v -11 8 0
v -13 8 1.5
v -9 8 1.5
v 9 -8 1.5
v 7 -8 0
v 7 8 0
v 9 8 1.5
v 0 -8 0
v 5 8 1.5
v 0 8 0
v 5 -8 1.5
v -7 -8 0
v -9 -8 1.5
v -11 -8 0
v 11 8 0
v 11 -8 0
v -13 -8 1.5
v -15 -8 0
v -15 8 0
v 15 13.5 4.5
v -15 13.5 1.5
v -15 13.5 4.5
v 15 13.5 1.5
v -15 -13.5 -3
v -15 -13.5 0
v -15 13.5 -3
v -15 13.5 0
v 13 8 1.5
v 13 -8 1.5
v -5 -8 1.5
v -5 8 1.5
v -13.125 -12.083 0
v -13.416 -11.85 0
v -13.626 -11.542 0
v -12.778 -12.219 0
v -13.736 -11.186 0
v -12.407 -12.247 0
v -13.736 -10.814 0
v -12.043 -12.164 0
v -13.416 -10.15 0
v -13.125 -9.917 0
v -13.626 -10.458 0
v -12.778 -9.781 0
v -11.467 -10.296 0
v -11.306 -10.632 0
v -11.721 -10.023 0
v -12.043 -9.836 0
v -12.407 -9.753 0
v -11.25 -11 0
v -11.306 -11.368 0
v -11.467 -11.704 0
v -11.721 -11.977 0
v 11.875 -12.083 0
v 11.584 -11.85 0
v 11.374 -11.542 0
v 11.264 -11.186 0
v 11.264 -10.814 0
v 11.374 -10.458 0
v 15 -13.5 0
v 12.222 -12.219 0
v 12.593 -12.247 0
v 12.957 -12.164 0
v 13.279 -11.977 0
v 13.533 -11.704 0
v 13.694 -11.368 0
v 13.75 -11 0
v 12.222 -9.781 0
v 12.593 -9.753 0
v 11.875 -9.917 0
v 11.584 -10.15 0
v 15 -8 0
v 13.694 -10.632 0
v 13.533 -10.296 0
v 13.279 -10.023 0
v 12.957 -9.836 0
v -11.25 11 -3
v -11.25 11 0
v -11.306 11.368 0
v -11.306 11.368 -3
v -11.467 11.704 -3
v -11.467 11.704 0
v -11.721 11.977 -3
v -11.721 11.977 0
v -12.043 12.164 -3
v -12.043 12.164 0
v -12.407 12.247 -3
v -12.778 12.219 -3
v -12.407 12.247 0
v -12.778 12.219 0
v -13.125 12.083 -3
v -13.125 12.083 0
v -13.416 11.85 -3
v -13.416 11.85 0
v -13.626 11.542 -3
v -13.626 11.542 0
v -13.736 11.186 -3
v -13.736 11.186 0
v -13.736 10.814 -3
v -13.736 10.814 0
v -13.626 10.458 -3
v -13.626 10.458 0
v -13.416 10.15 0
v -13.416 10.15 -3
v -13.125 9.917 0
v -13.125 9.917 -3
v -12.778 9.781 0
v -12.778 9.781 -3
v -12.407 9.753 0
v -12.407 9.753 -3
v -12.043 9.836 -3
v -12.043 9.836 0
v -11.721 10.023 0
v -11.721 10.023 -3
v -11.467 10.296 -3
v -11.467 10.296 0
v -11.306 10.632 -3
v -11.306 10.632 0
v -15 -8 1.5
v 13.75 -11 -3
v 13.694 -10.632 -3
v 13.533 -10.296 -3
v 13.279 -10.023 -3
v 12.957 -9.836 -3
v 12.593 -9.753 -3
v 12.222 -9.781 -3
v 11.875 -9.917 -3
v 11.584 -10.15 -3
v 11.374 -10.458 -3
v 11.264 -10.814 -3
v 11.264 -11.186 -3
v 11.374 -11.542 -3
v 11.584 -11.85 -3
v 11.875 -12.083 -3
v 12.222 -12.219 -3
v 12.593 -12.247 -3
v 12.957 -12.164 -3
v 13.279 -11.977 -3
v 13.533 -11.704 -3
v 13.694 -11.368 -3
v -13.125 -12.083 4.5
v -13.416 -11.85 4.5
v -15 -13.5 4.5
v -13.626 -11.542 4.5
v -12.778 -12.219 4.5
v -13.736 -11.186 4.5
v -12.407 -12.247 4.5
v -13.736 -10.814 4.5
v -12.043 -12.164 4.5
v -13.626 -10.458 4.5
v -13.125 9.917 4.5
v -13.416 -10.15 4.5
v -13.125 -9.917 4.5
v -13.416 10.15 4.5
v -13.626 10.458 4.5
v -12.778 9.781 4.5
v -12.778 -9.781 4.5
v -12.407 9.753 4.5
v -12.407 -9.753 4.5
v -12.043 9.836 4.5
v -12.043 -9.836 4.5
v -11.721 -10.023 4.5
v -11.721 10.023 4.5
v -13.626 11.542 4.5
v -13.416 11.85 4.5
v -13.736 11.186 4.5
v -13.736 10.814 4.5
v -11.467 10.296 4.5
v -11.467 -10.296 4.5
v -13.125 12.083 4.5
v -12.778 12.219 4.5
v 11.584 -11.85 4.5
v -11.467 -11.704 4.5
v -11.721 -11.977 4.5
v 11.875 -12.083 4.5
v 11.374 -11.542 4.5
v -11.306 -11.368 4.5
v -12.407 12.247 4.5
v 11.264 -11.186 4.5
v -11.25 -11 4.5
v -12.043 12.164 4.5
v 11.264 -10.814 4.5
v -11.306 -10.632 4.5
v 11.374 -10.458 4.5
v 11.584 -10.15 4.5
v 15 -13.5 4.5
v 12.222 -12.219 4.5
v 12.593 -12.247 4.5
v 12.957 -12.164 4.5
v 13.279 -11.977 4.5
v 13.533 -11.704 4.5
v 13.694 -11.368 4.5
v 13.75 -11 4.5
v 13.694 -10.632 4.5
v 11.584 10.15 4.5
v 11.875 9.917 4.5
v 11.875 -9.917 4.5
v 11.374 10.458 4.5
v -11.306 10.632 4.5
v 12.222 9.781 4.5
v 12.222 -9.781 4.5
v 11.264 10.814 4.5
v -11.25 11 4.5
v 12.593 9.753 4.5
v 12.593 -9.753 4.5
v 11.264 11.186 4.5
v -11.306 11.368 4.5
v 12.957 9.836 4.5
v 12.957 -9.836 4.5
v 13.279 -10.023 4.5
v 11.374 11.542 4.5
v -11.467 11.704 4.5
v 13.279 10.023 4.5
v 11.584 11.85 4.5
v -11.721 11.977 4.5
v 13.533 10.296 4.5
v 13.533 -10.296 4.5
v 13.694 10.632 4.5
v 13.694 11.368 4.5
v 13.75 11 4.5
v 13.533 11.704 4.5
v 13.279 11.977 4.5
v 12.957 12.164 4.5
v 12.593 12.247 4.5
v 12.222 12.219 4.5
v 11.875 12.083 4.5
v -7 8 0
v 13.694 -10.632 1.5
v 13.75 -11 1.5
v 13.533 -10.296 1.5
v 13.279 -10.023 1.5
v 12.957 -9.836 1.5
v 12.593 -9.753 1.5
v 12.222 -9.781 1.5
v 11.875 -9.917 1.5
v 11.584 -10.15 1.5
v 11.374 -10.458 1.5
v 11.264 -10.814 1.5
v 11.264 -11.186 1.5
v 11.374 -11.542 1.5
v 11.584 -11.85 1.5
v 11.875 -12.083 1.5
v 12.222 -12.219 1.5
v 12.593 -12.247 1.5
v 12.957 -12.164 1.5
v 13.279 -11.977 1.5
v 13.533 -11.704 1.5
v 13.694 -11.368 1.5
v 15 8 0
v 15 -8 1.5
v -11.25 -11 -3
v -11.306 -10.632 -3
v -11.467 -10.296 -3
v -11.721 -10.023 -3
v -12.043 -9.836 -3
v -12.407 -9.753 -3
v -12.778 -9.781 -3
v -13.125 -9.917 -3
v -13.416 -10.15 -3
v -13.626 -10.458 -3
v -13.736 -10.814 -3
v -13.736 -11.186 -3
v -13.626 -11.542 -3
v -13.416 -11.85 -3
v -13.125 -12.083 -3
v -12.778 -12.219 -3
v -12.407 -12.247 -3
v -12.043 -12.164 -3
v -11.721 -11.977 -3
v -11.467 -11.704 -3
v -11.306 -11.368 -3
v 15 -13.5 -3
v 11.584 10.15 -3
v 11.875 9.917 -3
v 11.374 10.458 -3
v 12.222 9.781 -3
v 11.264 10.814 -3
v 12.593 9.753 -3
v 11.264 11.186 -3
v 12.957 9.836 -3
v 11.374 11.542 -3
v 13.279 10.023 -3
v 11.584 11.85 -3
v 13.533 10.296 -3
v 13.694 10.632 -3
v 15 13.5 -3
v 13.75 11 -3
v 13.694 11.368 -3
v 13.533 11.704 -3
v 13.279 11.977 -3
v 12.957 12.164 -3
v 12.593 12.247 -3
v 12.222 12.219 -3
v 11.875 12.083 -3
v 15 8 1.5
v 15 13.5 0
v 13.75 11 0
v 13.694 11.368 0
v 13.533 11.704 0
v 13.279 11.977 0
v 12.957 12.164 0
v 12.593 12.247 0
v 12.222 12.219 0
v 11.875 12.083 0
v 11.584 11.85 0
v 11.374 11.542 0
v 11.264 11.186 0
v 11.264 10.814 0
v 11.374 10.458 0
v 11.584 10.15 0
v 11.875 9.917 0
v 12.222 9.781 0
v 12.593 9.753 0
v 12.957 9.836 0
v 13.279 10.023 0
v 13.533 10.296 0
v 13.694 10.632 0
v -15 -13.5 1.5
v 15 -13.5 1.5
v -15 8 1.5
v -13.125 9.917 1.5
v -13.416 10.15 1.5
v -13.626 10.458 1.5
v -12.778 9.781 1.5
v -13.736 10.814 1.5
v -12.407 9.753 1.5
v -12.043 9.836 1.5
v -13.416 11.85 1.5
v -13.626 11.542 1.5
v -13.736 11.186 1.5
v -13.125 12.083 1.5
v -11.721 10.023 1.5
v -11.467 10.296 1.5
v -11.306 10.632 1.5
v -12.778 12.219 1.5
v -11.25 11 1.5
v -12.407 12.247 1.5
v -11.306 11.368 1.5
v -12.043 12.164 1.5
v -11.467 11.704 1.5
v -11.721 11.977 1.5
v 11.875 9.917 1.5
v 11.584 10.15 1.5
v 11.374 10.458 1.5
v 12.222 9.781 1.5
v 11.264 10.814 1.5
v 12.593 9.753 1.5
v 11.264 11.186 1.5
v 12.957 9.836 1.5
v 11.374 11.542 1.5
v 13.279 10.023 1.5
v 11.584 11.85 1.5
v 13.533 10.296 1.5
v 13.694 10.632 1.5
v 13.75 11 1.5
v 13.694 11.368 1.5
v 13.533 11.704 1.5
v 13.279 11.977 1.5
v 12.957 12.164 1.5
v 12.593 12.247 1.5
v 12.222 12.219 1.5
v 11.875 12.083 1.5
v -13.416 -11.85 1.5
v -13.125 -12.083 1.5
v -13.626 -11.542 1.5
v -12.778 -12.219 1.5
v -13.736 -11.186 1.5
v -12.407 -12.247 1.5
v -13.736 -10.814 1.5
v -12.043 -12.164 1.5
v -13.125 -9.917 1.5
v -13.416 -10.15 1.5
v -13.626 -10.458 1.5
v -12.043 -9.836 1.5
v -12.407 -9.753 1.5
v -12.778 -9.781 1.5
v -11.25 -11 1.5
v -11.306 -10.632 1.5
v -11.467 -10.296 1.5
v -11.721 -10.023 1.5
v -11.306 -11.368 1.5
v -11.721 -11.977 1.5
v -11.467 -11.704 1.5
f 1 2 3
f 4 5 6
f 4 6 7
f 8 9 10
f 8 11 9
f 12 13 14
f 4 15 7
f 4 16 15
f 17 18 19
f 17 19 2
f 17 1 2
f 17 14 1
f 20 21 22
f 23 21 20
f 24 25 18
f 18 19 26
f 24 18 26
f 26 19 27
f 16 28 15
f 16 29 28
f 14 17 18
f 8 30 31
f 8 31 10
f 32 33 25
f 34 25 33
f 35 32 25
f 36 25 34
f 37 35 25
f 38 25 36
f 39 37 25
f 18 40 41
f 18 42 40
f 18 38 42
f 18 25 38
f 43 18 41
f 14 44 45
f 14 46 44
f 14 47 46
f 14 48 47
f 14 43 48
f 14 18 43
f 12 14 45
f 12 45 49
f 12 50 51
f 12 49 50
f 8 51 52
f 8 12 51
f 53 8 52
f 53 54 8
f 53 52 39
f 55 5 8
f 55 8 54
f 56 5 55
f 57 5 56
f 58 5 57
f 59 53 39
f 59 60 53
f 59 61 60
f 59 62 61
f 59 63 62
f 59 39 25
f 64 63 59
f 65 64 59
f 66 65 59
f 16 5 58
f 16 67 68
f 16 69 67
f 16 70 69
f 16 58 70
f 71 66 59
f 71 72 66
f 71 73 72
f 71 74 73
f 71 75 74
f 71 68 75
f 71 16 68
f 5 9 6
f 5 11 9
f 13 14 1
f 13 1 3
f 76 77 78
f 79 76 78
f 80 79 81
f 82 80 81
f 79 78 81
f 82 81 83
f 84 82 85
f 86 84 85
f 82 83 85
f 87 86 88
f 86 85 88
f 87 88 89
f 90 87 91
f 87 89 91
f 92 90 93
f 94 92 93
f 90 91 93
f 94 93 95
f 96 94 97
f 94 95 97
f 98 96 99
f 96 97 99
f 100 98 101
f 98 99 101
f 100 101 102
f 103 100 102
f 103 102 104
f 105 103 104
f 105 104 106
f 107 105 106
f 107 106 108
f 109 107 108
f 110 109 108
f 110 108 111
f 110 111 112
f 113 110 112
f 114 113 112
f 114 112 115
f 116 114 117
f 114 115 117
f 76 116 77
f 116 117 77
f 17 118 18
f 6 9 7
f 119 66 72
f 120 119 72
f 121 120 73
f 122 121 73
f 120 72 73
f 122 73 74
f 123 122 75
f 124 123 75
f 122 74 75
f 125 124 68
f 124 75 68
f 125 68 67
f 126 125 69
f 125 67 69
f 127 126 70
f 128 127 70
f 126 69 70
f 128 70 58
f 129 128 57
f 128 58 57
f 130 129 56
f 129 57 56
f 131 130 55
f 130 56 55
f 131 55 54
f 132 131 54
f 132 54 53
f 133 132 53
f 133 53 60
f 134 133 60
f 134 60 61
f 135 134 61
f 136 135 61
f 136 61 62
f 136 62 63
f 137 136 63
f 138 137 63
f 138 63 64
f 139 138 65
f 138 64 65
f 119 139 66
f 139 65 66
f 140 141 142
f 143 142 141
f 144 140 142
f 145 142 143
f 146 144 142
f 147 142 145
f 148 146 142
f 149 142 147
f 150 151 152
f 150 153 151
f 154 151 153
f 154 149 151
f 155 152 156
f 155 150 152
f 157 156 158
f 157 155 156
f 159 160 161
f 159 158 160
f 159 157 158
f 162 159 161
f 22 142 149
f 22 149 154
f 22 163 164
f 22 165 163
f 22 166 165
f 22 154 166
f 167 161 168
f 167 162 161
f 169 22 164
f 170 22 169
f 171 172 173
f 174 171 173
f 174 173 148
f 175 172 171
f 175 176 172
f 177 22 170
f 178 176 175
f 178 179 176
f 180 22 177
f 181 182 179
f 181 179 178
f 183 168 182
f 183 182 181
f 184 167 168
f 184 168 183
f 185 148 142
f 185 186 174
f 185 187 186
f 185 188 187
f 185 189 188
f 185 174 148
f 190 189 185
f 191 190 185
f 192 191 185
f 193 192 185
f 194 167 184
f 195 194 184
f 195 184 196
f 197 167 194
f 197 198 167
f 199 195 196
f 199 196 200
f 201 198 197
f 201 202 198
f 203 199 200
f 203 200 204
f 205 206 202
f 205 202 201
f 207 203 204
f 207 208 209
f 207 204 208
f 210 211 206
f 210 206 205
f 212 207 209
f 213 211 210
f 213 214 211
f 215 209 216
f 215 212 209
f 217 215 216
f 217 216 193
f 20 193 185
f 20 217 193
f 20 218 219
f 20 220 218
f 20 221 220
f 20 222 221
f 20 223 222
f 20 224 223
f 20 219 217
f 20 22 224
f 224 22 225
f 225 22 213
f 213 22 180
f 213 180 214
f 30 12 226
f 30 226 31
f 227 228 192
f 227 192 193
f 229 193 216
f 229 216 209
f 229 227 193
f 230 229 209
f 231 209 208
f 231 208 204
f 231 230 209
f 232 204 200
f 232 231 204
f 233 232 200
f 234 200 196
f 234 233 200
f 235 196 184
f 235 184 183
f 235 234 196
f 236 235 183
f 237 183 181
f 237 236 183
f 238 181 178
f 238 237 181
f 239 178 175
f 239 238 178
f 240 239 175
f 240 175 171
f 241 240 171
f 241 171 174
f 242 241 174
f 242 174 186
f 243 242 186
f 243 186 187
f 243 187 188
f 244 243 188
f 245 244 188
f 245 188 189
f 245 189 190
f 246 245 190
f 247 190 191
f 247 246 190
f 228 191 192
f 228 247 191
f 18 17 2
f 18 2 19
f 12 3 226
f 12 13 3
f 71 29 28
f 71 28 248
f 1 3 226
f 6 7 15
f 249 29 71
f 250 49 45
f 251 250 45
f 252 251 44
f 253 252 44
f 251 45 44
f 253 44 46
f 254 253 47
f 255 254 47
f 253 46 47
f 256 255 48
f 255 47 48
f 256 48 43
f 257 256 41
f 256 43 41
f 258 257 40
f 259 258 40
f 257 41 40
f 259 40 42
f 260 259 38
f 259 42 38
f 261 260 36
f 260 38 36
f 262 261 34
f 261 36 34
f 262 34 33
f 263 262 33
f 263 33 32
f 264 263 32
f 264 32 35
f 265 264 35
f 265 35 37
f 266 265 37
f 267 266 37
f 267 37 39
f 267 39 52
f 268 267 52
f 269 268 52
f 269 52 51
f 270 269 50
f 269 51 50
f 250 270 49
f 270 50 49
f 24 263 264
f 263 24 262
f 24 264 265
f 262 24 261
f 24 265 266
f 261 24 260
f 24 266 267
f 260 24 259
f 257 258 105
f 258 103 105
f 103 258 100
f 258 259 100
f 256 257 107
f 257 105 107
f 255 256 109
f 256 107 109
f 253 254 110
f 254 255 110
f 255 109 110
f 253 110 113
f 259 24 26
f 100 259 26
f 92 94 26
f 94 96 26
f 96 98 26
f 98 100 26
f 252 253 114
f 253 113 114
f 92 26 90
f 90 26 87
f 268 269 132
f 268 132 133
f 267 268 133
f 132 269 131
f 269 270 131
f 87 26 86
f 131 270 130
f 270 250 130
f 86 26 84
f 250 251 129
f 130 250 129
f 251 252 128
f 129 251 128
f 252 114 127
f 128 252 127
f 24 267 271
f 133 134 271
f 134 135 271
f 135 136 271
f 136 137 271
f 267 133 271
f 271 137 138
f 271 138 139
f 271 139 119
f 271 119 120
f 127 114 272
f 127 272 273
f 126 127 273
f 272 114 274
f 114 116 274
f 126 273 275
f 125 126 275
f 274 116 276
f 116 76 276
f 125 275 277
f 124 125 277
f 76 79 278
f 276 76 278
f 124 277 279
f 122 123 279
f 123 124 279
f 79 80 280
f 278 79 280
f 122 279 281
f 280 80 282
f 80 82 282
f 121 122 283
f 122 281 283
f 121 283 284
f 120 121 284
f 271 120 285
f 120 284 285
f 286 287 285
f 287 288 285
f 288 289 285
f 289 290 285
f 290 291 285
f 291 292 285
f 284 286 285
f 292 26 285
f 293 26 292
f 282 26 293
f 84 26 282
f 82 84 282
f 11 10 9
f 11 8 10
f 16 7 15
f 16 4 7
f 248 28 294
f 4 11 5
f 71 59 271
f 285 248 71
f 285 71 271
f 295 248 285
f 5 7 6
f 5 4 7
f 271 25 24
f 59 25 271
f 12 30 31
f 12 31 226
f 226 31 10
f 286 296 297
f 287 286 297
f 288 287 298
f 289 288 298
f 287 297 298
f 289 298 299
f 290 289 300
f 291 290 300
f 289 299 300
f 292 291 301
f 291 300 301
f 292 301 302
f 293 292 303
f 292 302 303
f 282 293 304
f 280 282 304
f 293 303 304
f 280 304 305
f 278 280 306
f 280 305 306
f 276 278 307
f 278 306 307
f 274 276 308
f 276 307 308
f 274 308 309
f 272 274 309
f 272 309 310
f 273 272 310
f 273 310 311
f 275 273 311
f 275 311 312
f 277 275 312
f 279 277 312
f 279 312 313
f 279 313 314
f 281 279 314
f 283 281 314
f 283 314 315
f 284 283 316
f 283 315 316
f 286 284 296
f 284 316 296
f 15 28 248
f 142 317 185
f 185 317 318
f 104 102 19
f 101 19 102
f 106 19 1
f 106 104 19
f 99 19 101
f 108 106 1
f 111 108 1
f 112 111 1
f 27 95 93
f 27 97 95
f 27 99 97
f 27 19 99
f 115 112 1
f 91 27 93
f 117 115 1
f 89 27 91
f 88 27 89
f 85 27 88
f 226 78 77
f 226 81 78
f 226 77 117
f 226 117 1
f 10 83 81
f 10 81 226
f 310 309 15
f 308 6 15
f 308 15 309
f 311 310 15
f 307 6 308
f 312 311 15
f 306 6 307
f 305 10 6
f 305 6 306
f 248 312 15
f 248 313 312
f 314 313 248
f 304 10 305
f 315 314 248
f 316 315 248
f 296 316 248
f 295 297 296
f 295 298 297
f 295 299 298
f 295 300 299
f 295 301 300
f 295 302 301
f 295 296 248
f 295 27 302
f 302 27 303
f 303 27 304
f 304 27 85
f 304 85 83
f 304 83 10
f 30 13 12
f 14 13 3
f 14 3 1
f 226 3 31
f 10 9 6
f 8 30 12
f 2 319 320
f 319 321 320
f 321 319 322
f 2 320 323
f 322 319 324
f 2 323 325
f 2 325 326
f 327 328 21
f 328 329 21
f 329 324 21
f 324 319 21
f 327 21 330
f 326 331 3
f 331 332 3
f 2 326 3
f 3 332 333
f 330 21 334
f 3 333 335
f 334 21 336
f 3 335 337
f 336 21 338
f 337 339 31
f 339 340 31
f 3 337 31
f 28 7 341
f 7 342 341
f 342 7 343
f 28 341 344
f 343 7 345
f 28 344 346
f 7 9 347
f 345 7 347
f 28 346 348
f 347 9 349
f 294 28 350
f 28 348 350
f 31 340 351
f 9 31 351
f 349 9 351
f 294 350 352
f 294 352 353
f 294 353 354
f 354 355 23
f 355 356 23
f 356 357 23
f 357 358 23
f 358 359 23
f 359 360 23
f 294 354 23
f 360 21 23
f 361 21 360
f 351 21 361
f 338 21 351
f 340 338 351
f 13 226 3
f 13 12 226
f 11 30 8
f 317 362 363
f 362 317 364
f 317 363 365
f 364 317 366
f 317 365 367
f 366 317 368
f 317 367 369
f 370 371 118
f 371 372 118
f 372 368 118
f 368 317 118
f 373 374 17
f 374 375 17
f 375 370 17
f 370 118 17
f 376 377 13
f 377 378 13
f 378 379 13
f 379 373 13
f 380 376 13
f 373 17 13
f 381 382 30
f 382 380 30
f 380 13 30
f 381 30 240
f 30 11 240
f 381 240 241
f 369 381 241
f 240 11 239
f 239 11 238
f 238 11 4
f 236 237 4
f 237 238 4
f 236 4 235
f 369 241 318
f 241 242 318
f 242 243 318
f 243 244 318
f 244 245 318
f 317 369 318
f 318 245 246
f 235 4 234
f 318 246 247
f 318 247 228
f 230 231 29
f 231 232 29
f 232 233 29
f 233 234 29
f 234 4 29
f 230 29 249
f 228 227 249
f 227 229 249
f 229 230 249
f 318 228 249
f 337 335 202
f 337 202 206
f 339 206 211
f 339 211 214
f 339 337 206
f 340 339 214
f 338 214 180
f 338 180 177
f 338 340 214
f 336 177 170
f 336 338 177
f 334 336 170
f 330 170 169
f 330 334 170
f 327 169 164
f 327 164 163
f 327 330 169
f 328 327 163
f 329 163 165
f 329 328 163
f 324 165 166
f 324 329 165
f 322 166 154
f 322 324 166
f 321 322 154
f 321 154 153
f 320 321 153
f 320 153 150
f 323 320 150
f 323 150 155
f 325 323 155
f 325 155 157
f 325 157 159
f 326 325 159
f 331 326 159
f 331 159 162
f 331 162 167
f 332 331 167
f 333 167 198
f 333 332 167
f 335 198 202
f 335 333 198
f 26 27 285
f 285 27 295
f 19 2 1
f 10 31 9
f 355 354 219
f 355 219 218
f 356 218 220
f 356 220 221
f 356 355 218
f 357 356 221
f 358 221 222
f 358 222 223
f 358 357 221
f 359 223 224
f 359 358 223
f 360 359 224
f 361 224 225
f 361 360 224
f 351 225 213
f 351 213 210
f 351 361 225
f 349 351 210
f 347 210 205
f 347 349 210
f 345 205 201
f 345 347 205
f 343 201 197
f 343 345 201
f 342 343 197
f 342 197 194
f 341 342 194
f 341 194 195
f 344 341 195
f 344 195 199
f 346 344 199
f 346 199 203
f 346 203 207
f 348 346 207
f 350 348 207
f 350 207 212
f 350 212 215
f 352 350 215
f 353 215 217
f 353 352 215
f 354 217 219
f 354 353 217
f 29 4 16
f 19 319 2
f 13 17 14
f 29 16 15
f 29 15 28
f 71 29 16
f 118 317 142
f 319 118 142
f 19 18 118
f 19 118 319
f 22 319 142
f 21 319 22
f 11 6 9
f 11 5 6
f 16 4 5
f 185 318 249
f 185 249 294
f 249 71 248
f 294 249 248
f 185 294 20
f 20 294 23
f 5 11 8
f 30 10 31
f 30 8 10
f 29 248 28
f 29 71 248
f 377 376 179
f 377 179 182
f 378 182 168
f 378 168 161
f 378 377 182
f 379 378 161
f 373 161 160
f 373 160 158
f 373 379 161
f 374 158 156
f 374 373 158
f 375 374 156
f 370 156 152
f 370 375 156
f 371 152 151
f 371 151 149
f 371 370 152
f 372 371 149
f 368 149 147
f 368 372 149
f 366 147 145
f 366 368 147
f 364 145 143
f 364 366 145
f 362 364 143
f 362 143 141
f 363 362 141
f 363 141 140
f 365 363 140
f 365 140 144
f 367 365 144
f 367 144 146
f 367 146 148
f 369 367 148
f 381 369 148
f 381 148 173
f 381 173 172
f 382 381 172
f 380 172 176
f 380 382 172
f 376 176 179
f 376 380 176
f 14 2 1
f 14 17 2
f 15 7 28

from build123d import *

# Parameters (mm, degrees)
F2_DEPTH = 8
F0_W     = 30
F0_H     = 27
F0_R     = 1.25
F3_DEPTH = 3
F4_DEPTH = 8
F5_START = 1.5
F5_DEPTH = 3


with BuildPart() as f2:
    # F1 (on Front) → F2 (new body, symmetric)
    with BuildSketch(Plane.XZ):
        Polygon((-5, 1.5), (-5, 0), (0, 0), align=None)
        Polygon((-5, 1.5), (-7, 0), (-5, 0), align=None)
    extrude(amount=F2_DEPTH, both=True)



with BuildPart() as f2b:
    # F1 (on Front) → F2, piece 2 (new body, symmetric)
    with BuildSketch(Plane.XZ):
        Polygon((-9, 1.5), (-9, 0), (-7, 0), align=None)
        Polygon((-9, 1.5), (-11, 0), (-9, 0), align=None)
    extrude(amount=F2_DEPTH, both=True)


with BuildPart() as f2c:
    # F1 (on Front) → F2, piece 3 (new body, symmetric)
    with BuildSketch(Plane.XZ):
        Polygon((-13, 1.5), (-13, 0), (-11, 0), align=None)
        Polygon((-13, 1.5), (-15, 0), (-13, 0), align=None)
    extrude(amount=F2_DEPTH, both=True)


with BuildPart() as f2d:
    # F1 (on Front) → F2, piece 4 (new body, symmetric)
    with BuildSketch(Plane.XZ):
        Polygon((5, 1.5), (0, 0), (5, 0), align=None)
        Polygon((7, 0), (5, 1.5), (5, 0), align=None)
    extrude(amount=F2_DEPTH, both=True)


with BuildPart() as f2e:
    # F1 (on Front) → F2, piece 5 (new body, symmetric)
    with BuildSketch(Plane.XZ):
        Polygon((9, 1.5), (7, 0), (9, 0), align=None)
        Polygon((11, 0), (9, 1.5), (9, 0), align=None)
    extrude(amount=F2_DEPTH, both=True)


with BuildPart() as f2f:
    # F1 (on Front) → F2, piece 6 (new body, symmetric)
    with BuildSketch(Plane.XZ):
        Polygon((13, 1.5), (11, 0), (13, 0), align=None)
        Polygon((15, 0), (13, 1.5), (13, 0), align=None)
    extrude(amount=F2_DEPTH, both=True)


with BuildPart() as f2_1:
    add(f2.part)

    add(f2b.part)  # F3 merges F2b

    add(f2c.part)  # F3 merges F2c

    add(f2d.part)  # F3 merges F2d

    add(f2e.part)  # F3 merges F2e

    add(f2f.part)  # F3 merges F2f
    # F0 (on Top) → F3 (join)
    with BuildSketch(Plane.XY):
        Rectangle(F0_W, F0_H)
        with Locations((-12.5, -11)):
            Circle(F0_R, mode=Mode.SUBTRACT)
        with Locations((12.5, -11)):
            Circle(F0_R, mode=Mode.SUBTRACT)
        with Locations((-12.5, 11)):
            Circle(F0_R, mode=Mode.SUBTRACT)
        with Locations((12.5, 11)):
            Circle(F0_R, mode=Mode.SUBTRACT)
    extrude(amount=-F3_DEPTH)


with BuildPart() as f4:
    # F1 (on Front) → F4 (new body, symmetric)
    with BuildSketch(Plane.XZ):
        Polygon((-15, 1.5), (-15, 0), (-13, 1.5), align=None)
    extrude(amount=F4_DEPTH, both=True)

    # F1 (on Front) → F4, piece 2 (join, symmetric)
    with BuildSketch(Plane.XZ):
        Polygon((-11, 1.5), (-13, 1.5), (-11, 0), align=None)
        Polygon((-11, 1.5), (-11, 0), (-9, 1.5), align=None)
    extrude(amount=F4_DEPTH, both=True)

    # F1 (on Front) → F4, piece 3 (join, symmetric)
    with BuildSketch(Plane.XZ):
        Polygon((-7, 1.5), (-9, 1.5), (-7, 0), align=None)
        Polygon((-7, 1.5), (-7, 0), (-5, 1.5), align=None)
    extrude(amount=F4_DEPTH, both=True)

    # F1 (on Front) → F4, piece 4 (join, symmetric)
    with BuildSketch(Plane.XZ):
        Polygon((5, 1.5), (-5, 1.5), (0, 0), align=None)
    extrude(amount=F4_DEPTH, both=True)

    # F1 (on Front) → F4, piece 5 (join, symmetric)
    with BuildSketch(Plane.XZ):
        Polygon((7, 1.5), (5, 1.5), (7, 0), align=None)
        Polygon((9, 1.5), (7, 1.5), (7, 0), align=None)
    extrude(amount=F4_DEPTH, both=True)

    # F1 (on Front) → F4, piece 6 (join, symmetric)
    with BuildSketch(Plane.XZ):
        Polygon((11, 1.5), (9, 1.5), (11, 0), align=None)
        Polygon((13, 1.5), (11, 1.5), (11, 0), align=None)
    extrude(amount=F4_DEPTH, both=True)

    # F1 (on Front) → F4, piece 7 (join, symmetric)
    with BuildSketch(Plane.XZ):
        Polygon((15, 1.5), (13, 1.5), (15, 0), align=None)
    extrude(amount=F4_DEPTH, both=True)

    # F0 (on Top) → F5 (join)
    with BuildSketch(Plane.XY.offset(F5_START)):
        Rectangle(F0_W, F0_H)
        with Locations((-12.5, -11)):
            Circle(F0_R, mode=Mode.SUBTRACT)
        with Locations((12.5, -11)):
            Circle(F0_R, mode=Mode.SUBTRACT)
        with Locations((-12.5, 11)):
            Circle(F0_R, mode=Mode.SUBTRACT)
        with Locations((12.5, 11)):
            Circle(F0_R, mode=Mode.SUBTRACT)
    extrude(amount=F5_DEPTH)


solid = Compound([f2_1.part, f4.part])
